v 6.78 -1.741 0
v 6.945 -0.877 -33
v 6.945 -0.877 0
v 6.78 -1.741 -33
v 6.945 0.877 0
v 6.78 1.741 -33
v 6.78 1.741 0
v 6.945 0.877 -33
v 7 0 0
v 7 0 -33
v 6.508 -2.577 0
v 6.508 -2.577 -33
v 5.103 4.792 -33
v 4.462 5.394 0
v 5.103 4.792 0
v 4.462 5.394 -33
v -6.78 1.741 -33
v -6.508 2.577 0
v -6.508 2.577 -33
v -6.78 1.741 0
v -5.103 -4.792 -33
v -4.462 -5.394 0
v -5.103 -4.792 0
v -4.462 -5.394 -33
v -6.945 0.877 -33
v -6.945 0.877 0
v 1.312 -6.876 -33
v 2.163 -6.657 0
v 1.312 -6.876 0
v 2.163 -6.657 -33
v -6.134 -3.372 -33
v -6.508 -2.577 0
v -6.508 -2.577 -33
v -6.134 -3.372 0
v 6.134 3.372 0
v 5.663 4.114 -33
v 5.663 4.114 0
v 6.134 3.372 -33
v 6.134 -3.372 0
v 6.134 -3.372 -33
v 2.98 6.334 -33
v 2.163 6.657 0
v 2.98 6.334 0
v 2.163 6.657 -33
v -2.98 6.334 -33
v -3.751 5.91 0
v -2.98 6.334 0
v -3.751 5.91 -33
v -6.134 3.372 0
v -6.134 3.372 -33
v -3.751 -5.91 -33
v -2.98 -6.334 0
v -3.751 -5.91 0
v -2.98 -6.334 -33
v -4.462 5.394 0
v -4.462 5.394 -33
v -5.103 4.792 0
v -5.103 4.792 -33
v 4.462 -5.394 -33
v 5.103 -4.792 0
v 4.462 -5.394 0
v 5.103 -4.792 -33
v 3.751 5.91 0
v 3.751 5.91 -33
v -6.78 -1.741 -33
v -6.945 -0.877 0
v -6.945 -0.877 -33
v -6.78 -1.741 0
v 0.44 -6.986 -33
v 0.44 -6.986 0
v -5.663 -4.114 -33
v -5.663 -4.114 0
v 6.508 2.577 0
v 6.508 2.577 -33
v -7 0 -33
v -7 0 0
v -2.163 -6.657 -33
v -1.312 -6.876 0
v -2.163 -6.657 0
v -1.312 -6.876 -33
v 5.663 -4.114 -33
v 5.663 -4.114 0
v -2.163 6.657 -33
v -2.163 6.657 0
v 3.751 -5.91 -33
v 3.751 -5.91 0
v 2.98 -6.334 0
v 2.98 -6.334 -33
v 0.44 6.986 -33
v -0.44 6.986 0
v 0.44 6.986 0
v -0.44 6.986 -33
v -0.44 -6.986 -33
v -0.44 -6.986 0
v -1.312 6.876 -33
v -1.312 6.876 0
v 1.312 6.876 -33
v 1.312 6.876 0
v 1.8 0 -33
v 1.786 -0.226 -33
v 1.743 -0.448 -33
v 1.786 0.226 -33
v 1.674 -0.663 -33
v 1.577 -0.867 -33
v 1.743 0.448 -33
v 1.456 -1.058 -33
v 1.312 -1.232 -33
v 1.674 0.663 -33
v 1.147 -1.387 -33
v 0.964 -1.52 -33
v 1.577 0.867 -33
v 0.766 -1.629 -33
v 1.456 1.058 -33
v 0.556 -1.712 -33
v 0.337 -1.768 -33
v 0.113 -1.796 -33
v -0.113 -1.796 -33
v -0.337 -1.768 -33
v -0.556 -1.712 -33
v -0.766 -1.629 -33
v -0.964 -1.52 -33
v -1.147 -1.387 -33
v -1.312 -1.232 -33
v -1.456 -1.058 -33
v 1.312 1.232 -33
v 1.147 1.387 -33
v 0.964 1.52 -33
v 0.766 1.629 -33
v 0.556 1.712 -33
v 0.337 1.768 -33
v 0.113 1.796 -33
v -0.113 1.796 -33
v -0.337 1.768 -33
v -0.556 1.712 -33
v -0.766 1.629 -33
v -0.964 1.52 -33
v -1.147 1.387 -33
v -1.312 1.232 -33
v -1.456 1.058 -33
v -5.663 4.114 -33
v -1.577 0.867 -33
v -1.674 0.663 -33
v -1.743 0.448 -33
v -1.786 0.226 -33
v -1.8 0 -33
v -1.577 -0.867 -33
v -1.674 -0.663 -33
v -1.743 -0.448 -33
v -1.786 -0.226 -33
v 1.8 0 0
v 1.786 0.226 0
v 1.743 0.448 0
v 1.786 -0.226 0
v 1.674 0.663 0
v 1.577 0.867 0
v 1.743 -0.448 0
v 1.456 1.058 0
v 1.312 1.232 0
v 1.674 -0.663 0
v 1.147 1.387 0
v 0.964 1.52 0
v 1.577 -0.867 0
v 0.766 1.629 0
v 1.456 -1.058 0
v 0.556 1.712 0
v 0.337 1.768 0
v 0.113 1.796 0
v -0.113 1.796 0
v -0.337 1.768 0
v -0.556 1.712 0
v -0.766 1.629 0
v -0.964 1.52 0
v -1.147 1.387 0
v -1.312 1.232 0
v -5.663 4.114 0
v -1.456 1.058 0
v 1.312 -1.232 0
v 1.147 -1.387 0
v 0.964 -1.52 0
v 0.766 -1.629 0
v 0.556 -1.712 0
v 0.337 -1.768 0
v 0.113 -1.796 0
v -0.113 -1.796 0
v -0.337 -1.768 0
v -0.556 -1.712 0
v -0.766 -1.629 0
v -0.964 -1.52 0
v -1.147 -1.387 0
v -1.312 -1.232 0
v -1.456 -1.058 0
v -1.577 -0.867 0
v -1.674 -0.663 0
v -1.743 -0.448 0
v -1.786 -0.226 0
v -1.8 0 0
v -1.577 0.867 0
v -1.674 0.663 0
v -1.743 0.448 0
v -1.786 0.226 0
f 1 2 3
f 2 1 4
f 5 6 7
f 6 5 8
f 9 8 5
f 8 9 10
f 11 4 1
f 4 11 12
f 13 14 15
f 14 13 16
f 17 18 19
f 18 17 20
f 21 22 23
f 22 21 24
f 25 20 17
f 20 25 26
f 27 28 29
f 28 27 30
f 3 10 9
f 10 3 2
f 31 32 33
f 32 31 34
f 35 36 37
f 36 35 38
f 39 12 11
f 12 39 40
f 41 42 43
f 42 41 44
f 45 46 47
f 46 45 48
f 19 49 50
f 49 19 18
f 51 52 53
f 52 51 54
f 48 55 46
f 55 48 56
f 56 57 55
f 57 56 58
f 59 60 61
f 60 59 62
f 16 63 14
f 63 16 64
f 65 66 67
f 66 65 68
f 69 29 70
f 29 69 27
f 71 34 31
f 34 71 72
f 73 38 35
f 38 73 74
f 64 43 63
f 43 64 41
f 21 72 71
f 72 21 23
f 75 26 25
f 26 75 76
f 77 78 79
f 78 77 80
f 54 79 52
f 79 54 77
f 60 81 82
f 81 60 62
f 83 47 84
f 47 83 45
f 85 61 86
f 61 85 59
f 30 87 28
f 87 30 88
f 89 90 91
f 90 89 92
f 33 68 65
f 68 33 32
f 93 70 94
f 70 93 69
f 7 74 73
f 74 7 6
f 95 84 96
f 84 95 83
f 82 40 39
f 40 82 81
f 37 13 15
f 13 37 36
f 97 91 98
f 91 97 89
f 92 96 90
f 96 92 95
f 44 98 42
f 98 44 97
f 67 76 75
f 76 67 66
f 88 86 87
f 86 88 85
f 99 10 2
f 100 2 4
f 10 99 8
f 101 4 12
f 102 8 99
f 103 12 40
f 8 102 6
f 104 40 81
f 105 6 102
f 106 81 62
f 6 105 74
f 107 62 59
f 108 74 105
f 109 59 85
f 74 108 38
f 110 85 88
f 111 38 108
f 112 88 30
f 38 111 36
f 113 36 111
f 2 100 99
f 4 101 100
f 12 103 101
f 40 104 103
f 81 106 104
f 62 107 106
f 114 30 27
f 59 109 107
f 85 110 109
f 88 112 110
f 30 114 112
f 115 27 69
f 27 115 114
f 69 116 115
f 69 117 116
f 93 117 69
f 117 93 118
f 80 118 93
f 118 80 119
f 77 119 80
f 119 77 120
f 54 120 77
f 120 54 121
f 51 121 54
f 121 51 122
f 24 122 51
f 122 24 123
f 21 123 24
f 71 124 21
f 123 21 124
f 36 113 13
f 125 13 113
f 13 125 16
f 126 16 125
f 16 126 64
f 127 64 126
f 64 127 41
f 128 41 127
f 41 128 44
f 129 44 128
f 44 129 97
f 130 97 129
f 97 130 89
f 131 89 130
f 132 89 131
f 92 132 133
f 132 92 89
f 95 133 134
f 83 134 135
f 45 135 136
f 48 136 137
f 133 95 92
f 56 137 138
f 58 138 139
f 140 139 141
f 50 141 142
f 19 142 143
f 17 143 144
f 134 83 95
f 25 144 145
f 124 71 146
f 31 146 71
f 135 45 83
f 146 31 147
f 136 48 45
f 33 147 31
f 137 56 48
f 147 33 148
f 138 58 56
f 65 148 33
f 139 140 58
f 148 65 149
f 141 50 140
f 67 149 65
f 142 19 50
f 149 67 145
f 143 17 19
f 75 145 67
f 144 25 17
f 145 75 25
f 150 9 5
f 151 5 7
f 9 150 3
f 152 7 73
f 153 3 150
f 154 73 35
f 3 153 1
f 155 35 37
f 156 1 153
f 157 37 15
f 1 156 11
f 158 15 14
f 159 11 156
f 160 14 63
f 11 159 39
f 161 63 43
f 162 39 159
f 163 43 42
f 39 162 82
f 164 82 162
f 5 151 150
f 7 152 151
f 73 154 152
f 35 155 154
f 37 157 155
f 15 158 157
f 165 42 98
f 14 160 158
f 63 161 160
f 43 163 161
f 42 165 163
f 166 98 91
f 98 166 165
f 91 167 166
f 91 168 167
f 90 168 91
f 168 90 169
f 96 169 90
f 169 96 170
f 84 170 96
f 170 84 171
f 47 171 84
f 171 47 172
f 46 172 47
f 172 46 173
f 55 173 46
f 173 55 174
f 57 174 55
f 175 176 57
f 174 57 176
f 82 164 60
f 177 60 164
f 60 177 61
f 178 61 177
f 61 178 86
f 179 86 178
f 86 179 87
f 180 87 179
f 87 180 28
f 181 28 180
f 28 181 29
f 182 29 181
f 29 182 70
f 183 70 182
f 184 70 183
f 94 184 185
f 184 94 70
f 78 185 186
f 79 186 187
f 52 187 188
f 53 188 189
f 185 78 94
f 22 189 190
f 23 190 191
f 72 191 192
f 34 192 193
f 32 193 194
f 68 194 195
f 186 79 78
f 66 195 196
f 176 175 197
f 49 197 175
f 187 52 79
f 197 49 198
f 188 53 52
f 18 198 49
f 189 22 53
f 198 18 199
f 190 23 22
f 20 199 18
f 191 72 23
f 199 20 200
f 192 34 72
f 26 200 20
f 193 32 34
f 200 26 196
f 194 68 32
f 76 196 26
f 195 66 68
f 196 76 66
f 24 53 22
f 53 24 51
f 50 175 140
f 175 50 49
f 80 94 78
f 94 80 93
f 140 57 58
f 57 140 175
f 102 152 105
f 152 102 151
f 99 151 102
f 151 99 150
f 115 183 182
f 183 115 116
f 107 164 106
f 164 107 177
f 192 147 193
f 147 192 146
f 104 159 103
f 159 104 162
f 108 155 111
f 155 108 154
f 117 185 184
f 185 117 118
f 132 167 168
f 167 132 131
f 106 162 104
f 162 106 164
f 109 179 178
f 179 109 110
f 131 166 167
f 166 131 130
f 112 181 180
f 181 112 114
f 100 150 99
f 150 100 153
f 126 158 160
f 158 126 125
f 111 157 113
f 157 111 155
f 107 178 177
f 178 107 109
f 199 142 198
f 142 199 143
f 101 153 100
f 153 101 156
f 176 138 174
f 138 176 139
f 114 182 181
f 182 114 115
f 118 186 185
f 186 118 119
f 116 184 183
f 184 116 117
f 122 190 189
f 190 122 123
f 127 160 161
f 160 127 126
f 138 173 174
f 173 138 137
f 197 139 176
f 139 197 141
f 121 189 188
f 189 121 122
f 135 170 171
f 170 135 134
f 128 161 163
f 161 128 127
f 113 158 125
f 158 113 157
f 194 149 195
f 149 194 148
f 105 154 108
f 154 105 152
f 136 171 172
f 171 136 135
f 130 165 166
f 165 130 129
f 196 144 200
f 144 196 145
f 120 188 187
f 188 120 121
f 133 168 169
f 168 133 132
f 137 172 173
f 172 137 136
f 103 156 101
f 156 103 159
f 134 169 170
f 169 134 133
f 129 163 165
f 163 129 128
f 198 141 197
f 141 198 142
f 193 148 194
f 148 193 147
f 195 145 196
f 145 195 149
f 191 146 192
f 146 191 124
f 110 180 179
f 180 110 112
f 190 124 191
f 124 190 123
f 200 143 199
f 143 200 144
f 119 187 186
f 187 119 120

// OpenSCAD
$fn = 50;


difference() {
	union() {
		translate(v = [0, 0, -33.0000000000]) {
			cylinder(h = 33, r = 7.0000000000);
		}
	}
	union() {
		#translate(v = [0, 0, -33]) {
			cylinder(h = 33, r = 1.8000000000);
		}
	}
}
